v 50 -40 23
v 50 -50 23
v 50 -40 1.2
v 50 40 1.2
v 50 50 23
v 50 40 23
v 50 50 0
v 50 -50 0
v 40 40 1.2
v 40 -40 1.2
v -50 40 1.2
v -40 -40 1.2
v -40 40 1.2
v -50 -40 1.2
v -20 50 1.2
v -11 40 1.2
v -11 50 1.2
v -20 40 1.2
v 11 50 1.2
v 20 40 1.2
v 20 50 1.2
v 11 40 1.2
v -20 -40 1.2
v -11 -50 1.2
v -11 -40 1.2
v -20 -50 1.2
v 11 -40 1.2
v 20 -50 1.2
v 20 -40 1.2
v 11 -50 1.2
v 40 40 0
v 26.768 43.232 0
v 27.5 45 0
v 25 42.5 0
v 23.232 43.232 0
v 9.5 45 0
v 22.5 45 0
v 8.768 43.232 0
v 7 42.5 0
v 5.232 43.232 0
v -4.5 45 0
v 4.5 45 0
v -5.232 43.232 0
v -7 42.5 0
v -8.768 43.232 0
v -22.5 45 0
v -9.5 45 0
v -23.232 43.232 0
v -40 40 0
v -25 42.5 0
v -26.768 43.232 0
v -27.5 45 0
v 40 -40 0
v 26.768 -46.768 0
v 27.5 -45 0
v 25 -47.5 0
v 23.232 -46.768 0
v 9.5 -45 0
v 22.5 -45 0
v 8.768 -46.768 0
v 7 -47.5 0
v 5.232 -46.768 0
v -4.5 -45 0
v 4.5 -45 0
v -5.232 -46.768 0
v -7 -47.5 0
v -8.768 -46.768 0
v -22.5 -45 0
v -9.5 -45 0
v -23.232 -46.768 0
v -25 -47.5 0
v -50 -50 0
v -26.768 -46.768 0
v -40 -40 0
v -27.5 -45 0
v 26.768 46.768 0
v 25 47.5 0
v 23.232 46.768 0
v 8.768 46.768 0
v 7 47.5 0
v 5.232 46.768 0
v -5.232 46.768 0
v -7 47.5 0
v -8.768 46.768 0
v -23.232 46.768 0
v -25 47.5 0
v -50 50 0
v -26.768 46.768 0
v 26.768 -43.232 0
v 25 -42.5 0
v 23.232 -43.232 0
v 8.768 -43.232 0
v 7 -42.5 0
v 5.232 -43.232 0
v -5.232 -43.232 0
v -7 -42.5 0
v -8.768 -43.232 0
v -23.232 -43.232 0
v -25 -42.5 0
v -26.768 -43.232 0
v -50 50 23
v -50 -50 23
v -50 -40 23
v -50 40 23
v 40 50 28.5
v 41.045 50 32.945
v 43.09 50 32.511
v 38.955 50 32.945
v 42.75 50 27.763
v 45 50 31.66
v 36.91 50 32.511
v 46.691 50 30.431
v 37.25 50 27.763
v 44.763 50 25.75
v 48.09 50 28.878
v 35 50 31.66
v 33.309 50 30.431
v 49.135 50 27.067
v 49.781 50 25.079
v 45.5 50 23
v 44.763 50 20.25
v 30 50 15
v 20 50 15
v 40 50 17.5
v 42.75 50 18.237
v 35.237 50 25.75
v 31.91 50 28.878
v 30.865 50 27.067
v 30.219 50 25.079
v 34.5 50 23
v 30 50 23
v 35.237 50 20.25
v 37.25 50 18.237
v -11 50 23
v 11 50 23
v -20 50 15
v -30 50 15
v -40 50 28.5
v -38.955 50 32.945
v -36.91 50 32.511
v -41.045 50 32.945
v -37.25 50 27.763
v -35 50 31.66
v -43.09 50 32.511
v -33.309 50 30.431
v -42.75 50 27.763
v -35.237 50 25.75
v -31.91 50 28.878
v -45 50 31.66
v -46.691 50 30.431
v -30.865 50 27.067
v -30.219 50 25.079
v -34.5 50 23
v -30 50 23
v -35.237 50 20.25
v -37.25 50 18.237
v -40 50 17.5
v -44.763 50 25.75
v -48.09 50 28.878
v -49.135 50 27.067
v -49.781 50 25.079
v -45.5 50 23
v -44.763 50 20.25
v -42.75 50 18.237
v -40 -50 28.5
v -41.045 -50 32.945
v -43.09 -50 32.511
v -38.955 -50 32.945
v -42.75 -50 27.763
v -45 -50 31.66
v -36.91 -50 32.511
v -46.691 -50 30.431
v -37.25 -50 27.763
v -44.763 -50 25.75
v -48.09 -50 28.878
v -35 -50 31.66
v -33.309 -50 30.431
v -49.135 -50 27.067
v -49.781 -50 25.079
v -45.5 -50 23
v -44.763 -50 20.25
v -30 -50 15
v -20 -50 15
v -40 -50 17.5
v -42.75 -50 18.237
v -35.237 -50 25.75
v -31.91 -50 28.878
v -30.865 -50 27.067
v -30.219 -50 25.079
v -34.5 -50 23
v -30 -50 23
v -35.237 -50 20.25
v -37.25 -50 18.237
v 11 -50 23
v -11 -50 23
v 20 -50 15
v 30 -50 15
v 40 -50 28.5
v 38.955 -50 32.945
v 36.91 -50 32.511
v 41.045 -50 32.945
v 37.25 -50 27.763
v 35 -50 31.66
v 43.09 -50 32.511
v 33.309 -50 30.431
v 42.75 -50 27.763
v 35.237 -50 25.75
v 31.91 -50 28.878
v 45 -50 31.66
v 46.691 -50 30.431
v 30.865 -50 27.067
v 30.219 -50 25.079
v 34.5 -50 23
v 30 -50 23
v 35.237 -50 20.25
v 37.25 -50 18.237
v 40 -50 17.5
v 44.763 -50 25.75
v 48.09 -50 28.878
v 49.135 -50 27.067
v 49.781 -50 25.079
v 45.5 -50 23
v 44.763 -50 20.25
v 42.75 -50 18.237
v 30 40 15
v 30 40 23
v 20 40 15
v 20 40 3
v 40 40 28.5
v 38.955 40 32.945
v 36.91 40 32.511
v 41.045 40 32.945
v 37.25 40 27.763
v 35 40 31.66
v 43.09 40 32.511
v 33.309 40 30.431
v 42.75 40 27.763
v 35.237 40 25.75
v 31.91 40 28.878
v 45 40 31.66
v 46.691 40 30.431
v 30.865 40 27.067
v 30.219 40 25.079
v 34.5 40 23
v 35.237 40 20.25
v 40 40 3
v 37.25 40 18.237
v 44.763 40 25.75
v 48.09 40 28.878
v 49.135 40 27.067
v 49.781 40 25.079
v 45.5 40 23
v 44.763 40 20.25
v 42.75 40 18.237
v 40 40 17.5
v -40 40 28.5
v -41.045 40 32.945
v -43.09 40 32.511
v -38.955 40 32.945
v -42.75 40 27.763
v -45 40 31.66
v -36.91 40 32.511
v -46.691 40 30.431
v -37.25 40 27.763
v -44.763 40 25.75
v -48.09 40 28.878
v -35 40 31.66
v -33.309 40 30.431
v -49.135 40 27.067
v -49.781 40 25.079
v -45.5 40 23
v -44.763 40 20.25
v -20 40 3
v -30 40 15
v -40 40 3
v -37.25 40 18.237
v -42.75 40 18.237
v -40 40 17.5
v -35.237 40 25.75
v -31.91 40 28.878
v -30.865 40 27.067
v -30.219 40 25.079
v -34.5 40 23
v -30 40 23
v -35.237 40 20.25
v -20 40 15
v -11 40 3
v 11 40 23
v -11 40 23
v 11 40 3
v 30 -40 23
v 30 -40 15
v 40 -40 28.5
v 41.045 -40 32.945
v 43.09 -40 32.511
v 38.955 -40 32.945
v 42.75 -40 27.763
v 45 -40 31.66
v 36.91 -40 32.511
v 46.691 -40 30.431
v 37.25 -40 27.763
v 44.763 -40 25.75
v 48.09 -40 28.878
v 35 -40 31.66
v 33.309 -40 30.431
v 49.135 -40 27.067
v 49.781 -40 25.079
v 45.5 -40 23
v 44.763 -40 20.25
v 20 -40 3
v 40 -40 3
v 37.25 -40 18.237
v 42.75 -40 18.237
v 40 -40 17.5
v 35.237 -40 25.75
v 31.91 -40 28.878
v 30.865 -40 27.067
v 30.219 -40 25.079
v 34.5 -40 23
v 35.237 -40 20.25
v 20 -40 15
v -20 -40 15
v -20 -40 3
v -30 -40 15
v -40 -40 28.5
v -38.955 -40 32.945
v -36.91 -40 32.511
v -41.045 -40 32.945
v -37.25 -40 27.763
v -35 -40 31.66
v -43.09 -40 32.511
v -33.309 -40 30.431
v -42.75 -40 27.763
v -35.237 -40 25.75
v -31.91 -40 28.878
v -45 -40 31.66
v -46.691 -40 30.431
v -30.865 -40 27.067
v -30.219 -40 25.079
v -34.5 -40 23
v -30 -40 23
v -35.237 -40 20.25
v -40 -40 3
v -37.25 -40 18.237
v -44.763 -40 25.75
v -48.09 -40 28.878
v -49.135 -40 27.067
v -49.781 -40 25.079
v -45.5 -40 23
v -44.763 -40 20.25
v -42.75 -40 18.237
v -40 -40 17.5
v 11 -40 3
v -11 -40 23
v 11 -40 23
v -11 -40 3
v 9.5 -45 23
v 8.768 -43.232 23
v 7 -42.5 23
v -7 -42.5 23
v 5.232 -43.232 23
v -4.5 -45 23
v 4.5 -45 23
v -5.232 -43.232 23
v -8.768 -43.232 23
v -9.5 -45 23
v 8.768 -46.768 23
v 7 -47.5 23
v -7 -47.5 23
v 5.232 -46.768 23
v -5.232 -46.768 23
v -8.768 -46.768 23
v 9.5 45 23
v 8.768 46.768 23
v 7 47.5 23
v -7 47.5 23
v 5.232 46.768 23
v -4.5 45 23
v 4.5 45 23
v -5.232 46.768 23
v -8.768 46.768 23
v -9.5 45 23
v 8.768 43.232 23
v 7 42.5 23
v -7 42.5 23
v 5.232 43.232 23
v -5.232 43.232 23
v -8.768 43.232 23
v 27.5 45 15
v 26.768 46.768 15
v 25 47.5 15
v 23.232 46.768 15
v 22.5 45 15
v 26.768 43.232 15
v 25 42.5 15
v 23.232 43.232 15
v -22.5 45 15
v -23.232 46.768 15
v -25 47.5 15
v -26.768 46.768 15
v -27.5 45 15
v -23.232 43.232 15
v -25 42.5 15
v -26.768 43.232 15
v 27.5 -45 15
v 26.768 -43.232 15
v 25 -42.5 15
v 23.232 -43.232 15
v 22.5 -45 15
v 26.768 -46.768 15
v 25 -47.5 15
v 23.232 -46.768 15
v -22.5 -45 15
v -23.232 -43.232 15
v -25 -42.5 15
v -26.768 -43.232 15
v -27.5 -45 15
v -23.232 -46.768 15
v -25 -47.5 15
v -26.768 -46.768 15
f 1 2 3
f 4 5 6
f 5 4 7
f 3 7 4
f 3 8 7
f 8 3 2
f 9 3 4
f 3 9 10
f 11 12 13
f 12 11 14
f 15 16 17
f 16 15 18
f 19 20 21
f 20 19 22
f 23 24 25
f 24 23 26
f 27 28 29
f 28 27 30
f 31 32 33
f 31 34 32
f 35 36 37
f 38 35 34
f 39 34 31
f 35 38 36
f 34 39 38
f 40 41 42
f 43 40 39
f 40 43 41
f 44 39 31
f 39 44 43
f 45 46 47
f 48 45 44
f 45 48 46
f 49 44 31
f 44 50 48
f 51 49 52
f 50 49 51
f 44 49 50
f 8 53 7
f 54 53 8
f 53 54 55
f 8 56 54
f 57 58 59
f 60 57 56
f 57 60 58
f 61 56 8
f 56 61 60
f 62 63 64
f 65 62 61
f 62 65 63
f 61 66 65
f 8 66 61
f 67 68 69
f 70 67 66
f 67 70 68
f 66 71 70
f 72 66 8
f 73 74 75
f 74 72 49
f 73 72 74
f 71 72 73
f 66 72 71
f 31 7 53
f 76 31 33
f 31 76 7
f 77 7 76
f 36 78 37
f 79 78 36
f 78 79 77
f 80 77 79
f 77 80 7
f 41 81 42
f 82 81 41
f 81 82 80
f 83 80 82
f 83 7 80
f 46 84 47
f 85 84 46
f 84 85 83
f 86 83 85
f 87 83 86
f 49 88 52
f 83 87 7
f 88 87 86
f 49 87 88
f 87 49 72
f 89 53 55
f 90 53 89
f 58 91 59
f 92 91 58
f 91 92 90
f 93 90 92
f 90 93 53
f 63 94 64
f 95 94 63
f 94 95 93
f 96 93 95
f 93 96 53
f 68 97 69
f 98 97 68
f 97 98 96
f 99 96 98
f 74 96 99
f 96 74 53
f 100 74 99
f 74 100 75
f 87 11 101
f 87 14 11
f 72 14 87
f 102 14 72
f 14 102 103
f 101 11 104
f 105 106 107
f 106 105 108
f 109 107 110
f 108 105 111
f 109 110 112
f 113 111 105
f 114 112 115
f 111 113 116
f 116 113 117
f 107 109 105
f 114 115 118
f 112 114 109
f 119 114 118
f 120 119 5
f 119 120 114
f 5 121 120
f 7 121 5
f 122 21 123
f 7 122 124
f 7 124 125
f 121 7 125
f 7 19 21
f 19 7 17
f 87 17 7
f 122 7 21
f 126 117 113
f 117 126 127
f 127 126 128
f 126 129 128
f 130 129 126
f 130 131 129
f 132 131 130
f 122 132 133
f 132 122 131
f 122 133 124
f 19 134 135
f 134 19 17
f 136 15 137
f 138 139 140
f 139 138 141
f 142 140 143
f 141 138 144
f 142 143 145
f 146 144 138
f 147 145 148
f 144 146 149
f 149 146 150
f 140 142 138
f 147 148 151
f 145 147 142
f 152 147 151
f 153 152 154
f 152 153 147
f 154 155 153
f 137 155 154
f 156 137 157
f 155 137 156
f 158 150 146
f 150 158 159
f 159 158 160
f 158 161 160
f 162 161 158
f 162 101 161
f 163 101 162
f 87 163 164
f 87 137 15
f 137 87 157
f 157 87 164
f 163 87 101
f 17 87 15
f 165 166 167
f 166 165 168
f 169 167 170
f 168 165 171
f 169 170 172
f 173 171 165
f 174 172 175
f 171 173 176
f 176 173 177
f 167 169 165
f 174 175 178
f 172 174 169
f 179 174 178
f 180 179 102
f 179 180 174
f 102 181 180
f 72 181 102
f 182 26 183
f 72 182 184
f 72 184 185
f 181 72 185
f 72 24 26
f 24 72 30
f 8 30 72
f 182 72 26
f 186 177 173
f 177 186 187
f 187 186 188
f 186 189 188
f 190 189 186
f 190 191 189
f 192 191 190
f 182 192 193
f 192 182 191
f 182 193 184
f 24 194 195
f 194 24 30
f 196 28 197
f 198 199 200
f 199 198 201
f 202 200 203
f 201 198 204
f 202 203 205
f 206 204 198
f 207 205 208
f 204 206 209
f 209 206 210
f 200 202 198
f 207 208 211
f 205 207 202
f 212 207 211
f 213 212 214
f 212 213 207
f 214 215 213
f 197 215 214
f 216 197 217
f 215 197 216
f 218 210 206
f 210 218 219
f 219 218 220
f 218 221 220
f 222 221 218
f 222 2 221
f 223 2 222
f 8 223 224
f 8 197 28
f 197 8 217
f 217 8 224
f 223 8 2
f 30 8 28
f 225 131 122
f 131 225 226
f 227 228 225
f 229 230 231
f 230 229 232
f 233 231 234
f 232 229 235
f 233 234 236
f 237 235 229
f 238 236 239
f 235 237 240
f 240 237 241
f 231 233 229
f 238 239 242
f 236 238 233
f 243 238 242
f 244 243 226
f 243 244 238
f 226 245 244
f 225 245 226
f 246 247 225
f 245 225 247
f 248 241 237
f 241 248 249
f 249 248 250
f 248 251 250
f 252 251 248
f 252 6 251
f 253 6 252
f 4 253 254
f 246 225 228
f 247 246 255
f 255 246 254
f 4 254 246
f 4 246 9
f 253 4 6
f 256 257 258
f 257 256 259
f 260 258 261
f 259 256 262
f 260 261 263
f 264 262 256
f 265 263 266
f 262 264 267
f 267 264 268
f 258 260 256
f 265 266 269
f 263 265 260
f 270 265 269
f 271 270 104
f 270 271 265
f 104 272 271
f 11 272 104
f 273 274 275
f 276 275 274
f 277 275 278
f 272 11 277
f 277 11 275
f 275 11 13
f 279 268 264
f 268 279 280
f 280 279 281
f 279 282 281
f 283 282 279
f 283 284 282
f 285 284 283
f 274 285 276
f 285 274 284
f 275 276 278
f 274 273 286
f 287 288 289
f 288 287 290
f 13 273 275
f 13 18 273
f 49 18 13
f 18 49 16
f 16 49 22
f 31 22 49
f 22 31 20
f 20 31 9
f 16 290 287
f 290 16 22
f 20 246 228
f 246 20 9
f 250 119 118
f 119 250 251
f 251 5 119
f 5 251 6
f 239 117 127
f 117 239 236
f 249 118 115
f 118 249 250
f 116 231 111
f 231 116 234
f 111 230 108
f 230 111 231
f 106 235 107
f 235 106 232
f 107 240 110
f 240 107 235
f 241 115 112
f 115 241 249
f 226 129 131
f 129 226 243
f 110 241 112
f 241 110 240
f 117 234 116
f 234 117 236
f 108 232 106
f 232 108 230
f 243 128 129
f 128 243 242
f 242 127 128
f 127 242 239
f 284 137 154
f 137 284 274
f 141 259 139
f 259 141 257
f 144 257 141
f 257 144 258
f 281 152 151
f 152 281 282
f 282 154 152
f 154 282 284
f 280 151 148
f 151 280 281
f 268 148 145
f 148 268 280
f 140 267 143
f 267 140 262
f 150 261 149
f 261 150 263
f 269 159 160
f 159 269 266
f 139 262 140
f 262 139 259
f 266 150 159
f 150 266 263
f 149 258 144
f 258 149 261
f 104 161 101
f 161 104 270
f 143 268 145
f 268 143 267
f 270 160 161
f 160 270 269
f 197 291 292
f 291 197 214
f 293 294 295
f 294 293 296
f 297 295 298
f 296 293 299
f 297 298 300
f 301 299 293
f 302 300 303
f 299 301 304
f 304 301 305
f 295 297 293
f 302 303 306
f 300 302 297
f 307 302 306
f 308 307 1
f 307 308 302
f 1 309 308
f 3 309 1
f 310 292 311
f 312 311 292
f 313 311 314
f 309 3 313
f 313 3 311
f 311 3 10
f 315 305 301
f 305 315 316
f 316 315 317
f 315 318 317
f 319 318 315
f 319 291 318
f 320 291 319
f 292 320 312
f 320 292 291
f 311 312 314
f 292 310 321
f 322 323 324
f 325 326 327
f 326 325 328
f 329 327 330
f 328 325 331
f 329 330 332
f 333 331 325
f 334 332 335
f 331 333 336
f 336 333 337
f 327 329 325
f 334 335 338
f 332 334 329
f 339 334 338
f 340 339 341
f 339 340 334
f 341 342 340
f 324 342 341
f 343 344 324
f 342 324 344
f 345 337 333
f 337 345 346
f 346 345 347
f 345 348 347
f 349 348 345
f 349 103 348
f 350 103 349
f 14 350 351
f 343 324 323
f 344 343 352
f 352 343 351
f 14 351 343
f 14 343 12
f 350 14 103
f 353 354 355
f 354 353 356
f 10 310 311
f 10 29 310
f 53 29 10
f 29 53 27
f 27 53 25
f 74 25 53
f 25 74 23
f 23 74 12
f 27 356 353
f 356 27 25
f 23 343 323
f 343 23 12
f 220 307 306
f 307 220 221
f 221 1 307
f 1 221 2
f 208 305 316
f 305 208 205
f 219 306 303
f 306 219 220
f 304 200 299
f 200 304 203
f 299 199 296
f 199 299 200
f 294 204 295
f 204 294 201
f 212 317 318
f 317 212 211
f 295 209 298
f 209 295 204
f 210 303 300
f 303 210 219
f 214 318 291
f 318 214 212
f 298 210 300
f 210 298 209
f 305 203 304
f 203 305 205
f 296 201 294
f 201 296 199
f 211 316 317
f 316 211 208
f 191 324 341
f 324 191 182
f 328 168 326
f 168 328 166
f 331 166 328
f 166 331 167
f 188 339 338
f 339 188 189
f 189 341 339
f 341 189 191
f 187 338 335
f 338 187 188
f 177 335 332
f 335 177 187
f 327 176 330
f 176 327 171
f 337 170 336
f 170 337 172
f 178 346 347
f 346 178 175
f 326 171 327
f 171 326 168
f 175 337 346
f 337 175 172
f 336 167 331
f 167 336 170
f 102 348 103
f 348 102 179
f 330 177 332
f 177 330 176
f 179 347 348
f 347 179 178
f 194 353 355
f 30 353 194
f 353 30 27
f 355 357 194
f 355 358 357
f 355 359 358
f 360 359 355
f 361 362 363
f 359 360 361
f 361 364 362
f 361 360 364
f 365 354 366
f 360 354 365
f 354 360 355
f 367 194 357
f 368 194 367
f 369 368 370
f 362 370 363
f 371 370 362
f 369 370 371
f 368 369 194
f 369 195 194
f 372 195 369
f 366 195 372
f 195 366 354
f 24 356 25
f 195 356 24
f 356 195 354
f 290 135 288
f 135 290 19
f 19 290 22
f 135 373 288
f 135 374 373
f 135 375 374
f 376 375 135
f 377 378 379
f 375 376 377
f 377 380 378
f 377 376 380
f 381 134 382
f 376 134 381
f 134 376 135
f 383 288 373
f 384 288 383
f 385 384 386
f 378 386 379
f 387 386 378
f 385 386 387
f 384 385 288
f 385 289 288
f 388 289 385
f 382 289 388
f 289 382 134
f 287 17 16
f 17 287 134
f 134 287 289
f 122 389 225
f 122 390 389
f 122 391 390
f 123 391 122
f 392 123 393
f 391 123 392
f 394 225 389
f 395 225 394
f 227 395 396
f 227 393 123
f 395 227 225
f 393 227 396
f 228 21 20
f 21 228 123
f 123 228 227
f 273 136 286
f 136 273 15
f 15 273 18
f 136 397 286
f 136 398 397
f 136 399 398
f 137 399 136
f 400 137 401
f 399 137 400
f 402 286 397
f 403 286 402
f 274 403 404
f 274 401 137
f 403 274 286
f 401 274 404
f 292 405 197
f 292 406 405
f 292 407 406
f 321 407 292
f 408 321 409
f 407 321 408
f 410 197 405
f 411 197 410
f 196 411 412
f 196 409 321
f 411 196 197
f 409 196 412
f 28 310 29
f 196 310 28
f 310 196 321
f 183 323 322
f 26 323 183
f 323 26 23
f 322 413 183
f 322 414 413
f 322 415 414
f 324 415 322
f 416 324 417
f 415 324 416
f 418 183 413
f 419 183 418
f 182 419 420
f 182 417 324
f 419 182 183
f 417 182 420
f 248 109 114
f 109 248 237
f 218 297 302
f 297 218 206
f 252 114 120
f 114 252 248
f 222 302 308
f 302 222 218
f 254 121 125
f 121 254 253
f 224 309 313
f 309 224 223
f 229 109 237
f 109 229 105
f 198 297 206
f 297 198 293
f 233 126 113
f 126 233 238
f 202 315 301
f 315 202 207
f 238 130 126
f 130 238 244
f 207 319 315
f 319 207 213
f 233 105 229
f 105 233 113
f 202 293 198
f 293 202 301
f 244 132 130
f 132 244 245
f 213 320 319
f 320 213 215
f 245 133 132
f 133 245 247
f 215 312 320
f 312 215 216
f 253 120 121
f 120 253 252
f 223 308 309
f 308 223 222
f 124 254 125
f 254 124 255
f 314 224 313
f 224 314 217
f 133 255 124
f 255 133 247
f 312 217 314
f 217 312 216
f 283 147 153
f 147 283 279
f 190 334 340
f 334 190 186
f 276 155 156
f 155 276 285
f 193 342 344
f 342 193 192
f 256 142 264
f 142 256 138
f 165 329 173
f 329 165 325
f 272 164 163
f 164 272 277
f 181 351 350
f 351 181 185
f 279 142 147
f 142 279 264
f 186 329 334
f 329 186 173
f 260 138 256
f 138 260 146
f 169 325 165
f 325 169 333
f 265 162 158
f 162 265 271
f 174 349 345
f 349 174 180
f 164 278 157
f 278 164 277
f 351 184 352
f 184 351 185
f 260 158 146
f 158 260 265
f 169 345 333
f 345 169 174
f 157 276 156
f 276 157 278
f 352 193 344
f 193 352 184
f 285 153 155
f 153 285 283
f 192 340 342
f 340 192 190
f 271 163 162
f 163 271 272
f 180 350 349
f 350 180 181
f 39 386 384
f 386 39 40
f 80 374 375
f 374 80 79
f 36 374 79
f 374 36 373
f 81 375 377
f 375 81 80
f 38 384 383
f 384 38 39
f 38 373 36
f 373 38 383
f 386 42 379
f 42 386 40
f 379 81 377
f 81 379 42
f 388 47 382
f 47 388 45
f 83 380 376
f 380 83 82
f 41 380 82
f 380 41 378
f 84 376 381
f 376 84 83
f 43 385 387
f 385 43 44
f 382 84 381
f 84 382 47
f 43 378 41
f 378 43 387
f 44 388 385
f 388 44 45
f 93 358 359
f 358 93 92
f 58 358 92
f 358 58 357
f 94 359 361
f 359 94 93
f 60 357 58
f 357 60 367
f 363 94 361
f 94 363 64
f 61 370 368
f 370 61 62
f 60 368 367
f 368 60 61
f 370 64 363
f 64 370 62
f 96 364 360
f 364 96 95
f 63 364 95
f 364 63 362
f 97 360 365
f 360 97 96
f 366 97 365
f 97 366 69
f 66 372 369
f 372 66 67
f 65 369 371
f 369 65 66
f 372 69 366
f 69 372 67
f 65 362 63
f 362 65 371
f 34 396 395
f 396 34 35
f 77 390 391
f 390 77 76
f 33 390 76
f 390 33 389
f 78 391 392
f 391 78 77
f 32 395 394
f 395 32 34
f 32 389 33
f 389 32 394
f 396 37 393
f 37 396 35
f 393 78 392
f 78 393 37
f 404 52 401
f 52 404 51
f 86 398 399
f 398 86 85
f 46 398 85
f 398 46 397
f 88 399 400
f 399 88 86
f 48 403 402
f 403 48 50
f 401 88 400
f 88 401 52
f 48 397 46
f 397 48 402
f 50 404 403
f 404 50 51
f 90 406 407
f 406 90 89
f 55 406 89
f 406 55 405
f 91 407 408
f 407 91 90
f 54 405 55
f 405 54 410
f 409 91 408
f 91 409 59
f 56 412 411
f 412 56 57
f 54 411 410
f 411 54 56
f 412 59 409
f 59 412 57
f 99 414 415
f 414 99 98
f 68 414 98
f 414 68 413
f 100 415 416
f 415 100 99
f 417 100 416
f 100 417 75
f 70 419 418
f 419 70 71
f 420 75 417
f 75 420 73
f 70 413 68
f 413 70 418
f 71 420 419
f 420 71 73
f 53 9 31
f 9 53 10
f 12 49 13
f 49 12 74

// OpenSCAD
// file: configuration.scad
// PRUSA Mendel  
// Configuration file
// GNU GPL v2
// Josef Průša
// josefprusa@me.com
// prusadjs.cz
// http://www.reprap.org/wiki/Prusa_Mendel
// http://github.com/prusajr/PrusaMendel

// M8 rod diameter
m8_diameter = 8.4;

// M8 nut diameter diameter
// Used for $fn nut trick -> cylinder(h = 5, r=4.5, $fn=6, center=true);
m8_nut_diameter = 16.4;

// M4 rod/screw diameter
m4_diameter = 5;

// M4 nut diameter diameter
// Used for $fn nut trick -> cylinder(h = 5, r=4.5, $fn=6, center=true);
m4_nut_diameter = 9;

// M3 rod/screw diameter
m3_diameter = 4.4;

// M3 nut diameter diameter
// Used for $fn nut trick -> cylinder(h = 5, r=4.5, $fn=6, center=true);
m3_nut_diameter = 7;

// Bushing holders diameter
bushing_diameter = 11;
// main file
// PRUSA Mendel  
// Y"carriage"
// Used for sliding on Y axis
// GNU GPL v2
// Josef Průša
// josefprusa@me.com
// prusadjs.cz
// http://www.reprap.org/wiki/Prusa_Mendel
// http://github.com/prusajr/PrusaMendel

// Stop moaning its not sturdy enough, 4 sliders and belts holders are connected together
// to ease up drilling holes to plate! This way they are always aligned properly.
// When you screw it to plate its sturdy as hell, ok?


include <configuration.scad>


difference(){
union(){
translate(v=[0,0,0.6]) cube(size=[100,100,1.2], center=true);

// bushings holder
translate(v=[40,45,11.5]) cube(size=[20,10,23], center=true);
translate(v=[40,50,23]) rotate([90,0,0]) cylinder(h=10, r=10);

translate(v=[-40,45,11.5]) cube(size=[20,10,23], center=true);
translate(v=[-40,50,23]) rotate([90,0,0]) cylinder(h=10, r=10);

translate(v=[40,-45,11.5]) cube(size=[20,10,23], center=true);
translate(v=[40,-40,23]) rotate([90,0,0]) cylinder(h=10, r=10);

translate(v=[-40,-45,11.5]) cube(size=[20,10,23], center=true);
translate(v=[-40,-40,23]) rotate([90,0,0]) cylinder(h=10, r=10);

//belt holders
translate(v=[0,-45,11.5]) cube(size=[22,10,23], center=true);
translate(v=[0,45,11.5]) cube(size=[22,10,23], center=true);

//holders for screws
translate(v=[25,45,7.5]) cube(size=[10,10,15], center=true);
translate(v=[-25,45,7.5]) cube(size=[10,10,15], center=true);
translate(v=[25,-45,7.5]) cube(size=[10,10,15], center=true);
translate(v=[-25,-45,7.5]) cube(size=[10,10,15], center=true);
}
// cutouts
// axes
 translate(v=[40,60,23]) rotate([90,0,0]) cylinder(h=120, r=bushing_diameter/2, $fn=12);
 translate(v=[-40,60,23]) rotate([90,0,0]) cylinder(h=120, r=bushing_diameter/2, $fn=12);

//screws
//belts
translate(v=[7,45,-1]) cylinder(h=30, r=m4_diameter/2, $fn=8);
translate(v=[-7,45,-1]) cylinder(h=30, r=m4_diameter/2, $fn=8);
translate(v=[7,-45,-1]) cylinder(h=30, r=m4_diameter/2, $fn=8);
translate(v=[-7,-45,-1]) cylinder(h=30, r=m4_diameter/2, $fn=8);

//frog
translate(v=[25,45,-1]) cylinder(h=30, r=m4_diameter/2, $fn=8);
translate(v=[-25,45,-1]) cylinder(h=30, r=m4_diameter/2, $fn=8);
translate(v=[25,-45,-1]) cylinder(h=30, r=m4_diameter/2, $fn=8);
translate(v=[-25,-45,-1]) cylinder(h=30, r=m4_diameter/2, $fn=8);

// main cutout
 translate(v=[0,0,1]) cube(size=[80,80,4], center=true);
}

// cutouts
// axes
% translate(v=[40,60,23]) rotate([90,0,0]) cylinder(h=120, r=bushing_diameter/2, $fn=12);
% translate(v=[-40,60,23]) rotate([90,0,0]) cylinder(h=120, r=bushing_diameter/2, $fn=12);

//screws
//belts
%translate(v=[7,45,-1]) cylinder(h=30, r=m4_diameter/2, $fn=8);
%translate(v=[-7,45,-1]) cylinder(h=30, r=m4_diameter/2, $fn=8);
%translate(v=[7,-45,-1]) cylinder(h=30, r=m4_diameter/2, $fn=8);
%translate(v=[-7,-45,-1]) cylinder(h=30, r=m4_diameter/2, $fn=8);

//frog
%translate(v=[25,45,-1]) cylinder(h=30, r=m4_diameter/2, $fn=8);
%translate(v=[-25,45,-1]) cylinder(h=30, r=m4_diameter/2, $fn=8);
%translate(v=[25,-45,-1]) cylinder(h=30, r=m4_diameter/2, $fn=8);
%translate(v=[-25,-45,-1]) cylinder(h=30, r=m4_diameter/2, $fn=8);

// main cutout
% translate(v=[0,0,1]) cube(size=[80,80,4], center=true);
